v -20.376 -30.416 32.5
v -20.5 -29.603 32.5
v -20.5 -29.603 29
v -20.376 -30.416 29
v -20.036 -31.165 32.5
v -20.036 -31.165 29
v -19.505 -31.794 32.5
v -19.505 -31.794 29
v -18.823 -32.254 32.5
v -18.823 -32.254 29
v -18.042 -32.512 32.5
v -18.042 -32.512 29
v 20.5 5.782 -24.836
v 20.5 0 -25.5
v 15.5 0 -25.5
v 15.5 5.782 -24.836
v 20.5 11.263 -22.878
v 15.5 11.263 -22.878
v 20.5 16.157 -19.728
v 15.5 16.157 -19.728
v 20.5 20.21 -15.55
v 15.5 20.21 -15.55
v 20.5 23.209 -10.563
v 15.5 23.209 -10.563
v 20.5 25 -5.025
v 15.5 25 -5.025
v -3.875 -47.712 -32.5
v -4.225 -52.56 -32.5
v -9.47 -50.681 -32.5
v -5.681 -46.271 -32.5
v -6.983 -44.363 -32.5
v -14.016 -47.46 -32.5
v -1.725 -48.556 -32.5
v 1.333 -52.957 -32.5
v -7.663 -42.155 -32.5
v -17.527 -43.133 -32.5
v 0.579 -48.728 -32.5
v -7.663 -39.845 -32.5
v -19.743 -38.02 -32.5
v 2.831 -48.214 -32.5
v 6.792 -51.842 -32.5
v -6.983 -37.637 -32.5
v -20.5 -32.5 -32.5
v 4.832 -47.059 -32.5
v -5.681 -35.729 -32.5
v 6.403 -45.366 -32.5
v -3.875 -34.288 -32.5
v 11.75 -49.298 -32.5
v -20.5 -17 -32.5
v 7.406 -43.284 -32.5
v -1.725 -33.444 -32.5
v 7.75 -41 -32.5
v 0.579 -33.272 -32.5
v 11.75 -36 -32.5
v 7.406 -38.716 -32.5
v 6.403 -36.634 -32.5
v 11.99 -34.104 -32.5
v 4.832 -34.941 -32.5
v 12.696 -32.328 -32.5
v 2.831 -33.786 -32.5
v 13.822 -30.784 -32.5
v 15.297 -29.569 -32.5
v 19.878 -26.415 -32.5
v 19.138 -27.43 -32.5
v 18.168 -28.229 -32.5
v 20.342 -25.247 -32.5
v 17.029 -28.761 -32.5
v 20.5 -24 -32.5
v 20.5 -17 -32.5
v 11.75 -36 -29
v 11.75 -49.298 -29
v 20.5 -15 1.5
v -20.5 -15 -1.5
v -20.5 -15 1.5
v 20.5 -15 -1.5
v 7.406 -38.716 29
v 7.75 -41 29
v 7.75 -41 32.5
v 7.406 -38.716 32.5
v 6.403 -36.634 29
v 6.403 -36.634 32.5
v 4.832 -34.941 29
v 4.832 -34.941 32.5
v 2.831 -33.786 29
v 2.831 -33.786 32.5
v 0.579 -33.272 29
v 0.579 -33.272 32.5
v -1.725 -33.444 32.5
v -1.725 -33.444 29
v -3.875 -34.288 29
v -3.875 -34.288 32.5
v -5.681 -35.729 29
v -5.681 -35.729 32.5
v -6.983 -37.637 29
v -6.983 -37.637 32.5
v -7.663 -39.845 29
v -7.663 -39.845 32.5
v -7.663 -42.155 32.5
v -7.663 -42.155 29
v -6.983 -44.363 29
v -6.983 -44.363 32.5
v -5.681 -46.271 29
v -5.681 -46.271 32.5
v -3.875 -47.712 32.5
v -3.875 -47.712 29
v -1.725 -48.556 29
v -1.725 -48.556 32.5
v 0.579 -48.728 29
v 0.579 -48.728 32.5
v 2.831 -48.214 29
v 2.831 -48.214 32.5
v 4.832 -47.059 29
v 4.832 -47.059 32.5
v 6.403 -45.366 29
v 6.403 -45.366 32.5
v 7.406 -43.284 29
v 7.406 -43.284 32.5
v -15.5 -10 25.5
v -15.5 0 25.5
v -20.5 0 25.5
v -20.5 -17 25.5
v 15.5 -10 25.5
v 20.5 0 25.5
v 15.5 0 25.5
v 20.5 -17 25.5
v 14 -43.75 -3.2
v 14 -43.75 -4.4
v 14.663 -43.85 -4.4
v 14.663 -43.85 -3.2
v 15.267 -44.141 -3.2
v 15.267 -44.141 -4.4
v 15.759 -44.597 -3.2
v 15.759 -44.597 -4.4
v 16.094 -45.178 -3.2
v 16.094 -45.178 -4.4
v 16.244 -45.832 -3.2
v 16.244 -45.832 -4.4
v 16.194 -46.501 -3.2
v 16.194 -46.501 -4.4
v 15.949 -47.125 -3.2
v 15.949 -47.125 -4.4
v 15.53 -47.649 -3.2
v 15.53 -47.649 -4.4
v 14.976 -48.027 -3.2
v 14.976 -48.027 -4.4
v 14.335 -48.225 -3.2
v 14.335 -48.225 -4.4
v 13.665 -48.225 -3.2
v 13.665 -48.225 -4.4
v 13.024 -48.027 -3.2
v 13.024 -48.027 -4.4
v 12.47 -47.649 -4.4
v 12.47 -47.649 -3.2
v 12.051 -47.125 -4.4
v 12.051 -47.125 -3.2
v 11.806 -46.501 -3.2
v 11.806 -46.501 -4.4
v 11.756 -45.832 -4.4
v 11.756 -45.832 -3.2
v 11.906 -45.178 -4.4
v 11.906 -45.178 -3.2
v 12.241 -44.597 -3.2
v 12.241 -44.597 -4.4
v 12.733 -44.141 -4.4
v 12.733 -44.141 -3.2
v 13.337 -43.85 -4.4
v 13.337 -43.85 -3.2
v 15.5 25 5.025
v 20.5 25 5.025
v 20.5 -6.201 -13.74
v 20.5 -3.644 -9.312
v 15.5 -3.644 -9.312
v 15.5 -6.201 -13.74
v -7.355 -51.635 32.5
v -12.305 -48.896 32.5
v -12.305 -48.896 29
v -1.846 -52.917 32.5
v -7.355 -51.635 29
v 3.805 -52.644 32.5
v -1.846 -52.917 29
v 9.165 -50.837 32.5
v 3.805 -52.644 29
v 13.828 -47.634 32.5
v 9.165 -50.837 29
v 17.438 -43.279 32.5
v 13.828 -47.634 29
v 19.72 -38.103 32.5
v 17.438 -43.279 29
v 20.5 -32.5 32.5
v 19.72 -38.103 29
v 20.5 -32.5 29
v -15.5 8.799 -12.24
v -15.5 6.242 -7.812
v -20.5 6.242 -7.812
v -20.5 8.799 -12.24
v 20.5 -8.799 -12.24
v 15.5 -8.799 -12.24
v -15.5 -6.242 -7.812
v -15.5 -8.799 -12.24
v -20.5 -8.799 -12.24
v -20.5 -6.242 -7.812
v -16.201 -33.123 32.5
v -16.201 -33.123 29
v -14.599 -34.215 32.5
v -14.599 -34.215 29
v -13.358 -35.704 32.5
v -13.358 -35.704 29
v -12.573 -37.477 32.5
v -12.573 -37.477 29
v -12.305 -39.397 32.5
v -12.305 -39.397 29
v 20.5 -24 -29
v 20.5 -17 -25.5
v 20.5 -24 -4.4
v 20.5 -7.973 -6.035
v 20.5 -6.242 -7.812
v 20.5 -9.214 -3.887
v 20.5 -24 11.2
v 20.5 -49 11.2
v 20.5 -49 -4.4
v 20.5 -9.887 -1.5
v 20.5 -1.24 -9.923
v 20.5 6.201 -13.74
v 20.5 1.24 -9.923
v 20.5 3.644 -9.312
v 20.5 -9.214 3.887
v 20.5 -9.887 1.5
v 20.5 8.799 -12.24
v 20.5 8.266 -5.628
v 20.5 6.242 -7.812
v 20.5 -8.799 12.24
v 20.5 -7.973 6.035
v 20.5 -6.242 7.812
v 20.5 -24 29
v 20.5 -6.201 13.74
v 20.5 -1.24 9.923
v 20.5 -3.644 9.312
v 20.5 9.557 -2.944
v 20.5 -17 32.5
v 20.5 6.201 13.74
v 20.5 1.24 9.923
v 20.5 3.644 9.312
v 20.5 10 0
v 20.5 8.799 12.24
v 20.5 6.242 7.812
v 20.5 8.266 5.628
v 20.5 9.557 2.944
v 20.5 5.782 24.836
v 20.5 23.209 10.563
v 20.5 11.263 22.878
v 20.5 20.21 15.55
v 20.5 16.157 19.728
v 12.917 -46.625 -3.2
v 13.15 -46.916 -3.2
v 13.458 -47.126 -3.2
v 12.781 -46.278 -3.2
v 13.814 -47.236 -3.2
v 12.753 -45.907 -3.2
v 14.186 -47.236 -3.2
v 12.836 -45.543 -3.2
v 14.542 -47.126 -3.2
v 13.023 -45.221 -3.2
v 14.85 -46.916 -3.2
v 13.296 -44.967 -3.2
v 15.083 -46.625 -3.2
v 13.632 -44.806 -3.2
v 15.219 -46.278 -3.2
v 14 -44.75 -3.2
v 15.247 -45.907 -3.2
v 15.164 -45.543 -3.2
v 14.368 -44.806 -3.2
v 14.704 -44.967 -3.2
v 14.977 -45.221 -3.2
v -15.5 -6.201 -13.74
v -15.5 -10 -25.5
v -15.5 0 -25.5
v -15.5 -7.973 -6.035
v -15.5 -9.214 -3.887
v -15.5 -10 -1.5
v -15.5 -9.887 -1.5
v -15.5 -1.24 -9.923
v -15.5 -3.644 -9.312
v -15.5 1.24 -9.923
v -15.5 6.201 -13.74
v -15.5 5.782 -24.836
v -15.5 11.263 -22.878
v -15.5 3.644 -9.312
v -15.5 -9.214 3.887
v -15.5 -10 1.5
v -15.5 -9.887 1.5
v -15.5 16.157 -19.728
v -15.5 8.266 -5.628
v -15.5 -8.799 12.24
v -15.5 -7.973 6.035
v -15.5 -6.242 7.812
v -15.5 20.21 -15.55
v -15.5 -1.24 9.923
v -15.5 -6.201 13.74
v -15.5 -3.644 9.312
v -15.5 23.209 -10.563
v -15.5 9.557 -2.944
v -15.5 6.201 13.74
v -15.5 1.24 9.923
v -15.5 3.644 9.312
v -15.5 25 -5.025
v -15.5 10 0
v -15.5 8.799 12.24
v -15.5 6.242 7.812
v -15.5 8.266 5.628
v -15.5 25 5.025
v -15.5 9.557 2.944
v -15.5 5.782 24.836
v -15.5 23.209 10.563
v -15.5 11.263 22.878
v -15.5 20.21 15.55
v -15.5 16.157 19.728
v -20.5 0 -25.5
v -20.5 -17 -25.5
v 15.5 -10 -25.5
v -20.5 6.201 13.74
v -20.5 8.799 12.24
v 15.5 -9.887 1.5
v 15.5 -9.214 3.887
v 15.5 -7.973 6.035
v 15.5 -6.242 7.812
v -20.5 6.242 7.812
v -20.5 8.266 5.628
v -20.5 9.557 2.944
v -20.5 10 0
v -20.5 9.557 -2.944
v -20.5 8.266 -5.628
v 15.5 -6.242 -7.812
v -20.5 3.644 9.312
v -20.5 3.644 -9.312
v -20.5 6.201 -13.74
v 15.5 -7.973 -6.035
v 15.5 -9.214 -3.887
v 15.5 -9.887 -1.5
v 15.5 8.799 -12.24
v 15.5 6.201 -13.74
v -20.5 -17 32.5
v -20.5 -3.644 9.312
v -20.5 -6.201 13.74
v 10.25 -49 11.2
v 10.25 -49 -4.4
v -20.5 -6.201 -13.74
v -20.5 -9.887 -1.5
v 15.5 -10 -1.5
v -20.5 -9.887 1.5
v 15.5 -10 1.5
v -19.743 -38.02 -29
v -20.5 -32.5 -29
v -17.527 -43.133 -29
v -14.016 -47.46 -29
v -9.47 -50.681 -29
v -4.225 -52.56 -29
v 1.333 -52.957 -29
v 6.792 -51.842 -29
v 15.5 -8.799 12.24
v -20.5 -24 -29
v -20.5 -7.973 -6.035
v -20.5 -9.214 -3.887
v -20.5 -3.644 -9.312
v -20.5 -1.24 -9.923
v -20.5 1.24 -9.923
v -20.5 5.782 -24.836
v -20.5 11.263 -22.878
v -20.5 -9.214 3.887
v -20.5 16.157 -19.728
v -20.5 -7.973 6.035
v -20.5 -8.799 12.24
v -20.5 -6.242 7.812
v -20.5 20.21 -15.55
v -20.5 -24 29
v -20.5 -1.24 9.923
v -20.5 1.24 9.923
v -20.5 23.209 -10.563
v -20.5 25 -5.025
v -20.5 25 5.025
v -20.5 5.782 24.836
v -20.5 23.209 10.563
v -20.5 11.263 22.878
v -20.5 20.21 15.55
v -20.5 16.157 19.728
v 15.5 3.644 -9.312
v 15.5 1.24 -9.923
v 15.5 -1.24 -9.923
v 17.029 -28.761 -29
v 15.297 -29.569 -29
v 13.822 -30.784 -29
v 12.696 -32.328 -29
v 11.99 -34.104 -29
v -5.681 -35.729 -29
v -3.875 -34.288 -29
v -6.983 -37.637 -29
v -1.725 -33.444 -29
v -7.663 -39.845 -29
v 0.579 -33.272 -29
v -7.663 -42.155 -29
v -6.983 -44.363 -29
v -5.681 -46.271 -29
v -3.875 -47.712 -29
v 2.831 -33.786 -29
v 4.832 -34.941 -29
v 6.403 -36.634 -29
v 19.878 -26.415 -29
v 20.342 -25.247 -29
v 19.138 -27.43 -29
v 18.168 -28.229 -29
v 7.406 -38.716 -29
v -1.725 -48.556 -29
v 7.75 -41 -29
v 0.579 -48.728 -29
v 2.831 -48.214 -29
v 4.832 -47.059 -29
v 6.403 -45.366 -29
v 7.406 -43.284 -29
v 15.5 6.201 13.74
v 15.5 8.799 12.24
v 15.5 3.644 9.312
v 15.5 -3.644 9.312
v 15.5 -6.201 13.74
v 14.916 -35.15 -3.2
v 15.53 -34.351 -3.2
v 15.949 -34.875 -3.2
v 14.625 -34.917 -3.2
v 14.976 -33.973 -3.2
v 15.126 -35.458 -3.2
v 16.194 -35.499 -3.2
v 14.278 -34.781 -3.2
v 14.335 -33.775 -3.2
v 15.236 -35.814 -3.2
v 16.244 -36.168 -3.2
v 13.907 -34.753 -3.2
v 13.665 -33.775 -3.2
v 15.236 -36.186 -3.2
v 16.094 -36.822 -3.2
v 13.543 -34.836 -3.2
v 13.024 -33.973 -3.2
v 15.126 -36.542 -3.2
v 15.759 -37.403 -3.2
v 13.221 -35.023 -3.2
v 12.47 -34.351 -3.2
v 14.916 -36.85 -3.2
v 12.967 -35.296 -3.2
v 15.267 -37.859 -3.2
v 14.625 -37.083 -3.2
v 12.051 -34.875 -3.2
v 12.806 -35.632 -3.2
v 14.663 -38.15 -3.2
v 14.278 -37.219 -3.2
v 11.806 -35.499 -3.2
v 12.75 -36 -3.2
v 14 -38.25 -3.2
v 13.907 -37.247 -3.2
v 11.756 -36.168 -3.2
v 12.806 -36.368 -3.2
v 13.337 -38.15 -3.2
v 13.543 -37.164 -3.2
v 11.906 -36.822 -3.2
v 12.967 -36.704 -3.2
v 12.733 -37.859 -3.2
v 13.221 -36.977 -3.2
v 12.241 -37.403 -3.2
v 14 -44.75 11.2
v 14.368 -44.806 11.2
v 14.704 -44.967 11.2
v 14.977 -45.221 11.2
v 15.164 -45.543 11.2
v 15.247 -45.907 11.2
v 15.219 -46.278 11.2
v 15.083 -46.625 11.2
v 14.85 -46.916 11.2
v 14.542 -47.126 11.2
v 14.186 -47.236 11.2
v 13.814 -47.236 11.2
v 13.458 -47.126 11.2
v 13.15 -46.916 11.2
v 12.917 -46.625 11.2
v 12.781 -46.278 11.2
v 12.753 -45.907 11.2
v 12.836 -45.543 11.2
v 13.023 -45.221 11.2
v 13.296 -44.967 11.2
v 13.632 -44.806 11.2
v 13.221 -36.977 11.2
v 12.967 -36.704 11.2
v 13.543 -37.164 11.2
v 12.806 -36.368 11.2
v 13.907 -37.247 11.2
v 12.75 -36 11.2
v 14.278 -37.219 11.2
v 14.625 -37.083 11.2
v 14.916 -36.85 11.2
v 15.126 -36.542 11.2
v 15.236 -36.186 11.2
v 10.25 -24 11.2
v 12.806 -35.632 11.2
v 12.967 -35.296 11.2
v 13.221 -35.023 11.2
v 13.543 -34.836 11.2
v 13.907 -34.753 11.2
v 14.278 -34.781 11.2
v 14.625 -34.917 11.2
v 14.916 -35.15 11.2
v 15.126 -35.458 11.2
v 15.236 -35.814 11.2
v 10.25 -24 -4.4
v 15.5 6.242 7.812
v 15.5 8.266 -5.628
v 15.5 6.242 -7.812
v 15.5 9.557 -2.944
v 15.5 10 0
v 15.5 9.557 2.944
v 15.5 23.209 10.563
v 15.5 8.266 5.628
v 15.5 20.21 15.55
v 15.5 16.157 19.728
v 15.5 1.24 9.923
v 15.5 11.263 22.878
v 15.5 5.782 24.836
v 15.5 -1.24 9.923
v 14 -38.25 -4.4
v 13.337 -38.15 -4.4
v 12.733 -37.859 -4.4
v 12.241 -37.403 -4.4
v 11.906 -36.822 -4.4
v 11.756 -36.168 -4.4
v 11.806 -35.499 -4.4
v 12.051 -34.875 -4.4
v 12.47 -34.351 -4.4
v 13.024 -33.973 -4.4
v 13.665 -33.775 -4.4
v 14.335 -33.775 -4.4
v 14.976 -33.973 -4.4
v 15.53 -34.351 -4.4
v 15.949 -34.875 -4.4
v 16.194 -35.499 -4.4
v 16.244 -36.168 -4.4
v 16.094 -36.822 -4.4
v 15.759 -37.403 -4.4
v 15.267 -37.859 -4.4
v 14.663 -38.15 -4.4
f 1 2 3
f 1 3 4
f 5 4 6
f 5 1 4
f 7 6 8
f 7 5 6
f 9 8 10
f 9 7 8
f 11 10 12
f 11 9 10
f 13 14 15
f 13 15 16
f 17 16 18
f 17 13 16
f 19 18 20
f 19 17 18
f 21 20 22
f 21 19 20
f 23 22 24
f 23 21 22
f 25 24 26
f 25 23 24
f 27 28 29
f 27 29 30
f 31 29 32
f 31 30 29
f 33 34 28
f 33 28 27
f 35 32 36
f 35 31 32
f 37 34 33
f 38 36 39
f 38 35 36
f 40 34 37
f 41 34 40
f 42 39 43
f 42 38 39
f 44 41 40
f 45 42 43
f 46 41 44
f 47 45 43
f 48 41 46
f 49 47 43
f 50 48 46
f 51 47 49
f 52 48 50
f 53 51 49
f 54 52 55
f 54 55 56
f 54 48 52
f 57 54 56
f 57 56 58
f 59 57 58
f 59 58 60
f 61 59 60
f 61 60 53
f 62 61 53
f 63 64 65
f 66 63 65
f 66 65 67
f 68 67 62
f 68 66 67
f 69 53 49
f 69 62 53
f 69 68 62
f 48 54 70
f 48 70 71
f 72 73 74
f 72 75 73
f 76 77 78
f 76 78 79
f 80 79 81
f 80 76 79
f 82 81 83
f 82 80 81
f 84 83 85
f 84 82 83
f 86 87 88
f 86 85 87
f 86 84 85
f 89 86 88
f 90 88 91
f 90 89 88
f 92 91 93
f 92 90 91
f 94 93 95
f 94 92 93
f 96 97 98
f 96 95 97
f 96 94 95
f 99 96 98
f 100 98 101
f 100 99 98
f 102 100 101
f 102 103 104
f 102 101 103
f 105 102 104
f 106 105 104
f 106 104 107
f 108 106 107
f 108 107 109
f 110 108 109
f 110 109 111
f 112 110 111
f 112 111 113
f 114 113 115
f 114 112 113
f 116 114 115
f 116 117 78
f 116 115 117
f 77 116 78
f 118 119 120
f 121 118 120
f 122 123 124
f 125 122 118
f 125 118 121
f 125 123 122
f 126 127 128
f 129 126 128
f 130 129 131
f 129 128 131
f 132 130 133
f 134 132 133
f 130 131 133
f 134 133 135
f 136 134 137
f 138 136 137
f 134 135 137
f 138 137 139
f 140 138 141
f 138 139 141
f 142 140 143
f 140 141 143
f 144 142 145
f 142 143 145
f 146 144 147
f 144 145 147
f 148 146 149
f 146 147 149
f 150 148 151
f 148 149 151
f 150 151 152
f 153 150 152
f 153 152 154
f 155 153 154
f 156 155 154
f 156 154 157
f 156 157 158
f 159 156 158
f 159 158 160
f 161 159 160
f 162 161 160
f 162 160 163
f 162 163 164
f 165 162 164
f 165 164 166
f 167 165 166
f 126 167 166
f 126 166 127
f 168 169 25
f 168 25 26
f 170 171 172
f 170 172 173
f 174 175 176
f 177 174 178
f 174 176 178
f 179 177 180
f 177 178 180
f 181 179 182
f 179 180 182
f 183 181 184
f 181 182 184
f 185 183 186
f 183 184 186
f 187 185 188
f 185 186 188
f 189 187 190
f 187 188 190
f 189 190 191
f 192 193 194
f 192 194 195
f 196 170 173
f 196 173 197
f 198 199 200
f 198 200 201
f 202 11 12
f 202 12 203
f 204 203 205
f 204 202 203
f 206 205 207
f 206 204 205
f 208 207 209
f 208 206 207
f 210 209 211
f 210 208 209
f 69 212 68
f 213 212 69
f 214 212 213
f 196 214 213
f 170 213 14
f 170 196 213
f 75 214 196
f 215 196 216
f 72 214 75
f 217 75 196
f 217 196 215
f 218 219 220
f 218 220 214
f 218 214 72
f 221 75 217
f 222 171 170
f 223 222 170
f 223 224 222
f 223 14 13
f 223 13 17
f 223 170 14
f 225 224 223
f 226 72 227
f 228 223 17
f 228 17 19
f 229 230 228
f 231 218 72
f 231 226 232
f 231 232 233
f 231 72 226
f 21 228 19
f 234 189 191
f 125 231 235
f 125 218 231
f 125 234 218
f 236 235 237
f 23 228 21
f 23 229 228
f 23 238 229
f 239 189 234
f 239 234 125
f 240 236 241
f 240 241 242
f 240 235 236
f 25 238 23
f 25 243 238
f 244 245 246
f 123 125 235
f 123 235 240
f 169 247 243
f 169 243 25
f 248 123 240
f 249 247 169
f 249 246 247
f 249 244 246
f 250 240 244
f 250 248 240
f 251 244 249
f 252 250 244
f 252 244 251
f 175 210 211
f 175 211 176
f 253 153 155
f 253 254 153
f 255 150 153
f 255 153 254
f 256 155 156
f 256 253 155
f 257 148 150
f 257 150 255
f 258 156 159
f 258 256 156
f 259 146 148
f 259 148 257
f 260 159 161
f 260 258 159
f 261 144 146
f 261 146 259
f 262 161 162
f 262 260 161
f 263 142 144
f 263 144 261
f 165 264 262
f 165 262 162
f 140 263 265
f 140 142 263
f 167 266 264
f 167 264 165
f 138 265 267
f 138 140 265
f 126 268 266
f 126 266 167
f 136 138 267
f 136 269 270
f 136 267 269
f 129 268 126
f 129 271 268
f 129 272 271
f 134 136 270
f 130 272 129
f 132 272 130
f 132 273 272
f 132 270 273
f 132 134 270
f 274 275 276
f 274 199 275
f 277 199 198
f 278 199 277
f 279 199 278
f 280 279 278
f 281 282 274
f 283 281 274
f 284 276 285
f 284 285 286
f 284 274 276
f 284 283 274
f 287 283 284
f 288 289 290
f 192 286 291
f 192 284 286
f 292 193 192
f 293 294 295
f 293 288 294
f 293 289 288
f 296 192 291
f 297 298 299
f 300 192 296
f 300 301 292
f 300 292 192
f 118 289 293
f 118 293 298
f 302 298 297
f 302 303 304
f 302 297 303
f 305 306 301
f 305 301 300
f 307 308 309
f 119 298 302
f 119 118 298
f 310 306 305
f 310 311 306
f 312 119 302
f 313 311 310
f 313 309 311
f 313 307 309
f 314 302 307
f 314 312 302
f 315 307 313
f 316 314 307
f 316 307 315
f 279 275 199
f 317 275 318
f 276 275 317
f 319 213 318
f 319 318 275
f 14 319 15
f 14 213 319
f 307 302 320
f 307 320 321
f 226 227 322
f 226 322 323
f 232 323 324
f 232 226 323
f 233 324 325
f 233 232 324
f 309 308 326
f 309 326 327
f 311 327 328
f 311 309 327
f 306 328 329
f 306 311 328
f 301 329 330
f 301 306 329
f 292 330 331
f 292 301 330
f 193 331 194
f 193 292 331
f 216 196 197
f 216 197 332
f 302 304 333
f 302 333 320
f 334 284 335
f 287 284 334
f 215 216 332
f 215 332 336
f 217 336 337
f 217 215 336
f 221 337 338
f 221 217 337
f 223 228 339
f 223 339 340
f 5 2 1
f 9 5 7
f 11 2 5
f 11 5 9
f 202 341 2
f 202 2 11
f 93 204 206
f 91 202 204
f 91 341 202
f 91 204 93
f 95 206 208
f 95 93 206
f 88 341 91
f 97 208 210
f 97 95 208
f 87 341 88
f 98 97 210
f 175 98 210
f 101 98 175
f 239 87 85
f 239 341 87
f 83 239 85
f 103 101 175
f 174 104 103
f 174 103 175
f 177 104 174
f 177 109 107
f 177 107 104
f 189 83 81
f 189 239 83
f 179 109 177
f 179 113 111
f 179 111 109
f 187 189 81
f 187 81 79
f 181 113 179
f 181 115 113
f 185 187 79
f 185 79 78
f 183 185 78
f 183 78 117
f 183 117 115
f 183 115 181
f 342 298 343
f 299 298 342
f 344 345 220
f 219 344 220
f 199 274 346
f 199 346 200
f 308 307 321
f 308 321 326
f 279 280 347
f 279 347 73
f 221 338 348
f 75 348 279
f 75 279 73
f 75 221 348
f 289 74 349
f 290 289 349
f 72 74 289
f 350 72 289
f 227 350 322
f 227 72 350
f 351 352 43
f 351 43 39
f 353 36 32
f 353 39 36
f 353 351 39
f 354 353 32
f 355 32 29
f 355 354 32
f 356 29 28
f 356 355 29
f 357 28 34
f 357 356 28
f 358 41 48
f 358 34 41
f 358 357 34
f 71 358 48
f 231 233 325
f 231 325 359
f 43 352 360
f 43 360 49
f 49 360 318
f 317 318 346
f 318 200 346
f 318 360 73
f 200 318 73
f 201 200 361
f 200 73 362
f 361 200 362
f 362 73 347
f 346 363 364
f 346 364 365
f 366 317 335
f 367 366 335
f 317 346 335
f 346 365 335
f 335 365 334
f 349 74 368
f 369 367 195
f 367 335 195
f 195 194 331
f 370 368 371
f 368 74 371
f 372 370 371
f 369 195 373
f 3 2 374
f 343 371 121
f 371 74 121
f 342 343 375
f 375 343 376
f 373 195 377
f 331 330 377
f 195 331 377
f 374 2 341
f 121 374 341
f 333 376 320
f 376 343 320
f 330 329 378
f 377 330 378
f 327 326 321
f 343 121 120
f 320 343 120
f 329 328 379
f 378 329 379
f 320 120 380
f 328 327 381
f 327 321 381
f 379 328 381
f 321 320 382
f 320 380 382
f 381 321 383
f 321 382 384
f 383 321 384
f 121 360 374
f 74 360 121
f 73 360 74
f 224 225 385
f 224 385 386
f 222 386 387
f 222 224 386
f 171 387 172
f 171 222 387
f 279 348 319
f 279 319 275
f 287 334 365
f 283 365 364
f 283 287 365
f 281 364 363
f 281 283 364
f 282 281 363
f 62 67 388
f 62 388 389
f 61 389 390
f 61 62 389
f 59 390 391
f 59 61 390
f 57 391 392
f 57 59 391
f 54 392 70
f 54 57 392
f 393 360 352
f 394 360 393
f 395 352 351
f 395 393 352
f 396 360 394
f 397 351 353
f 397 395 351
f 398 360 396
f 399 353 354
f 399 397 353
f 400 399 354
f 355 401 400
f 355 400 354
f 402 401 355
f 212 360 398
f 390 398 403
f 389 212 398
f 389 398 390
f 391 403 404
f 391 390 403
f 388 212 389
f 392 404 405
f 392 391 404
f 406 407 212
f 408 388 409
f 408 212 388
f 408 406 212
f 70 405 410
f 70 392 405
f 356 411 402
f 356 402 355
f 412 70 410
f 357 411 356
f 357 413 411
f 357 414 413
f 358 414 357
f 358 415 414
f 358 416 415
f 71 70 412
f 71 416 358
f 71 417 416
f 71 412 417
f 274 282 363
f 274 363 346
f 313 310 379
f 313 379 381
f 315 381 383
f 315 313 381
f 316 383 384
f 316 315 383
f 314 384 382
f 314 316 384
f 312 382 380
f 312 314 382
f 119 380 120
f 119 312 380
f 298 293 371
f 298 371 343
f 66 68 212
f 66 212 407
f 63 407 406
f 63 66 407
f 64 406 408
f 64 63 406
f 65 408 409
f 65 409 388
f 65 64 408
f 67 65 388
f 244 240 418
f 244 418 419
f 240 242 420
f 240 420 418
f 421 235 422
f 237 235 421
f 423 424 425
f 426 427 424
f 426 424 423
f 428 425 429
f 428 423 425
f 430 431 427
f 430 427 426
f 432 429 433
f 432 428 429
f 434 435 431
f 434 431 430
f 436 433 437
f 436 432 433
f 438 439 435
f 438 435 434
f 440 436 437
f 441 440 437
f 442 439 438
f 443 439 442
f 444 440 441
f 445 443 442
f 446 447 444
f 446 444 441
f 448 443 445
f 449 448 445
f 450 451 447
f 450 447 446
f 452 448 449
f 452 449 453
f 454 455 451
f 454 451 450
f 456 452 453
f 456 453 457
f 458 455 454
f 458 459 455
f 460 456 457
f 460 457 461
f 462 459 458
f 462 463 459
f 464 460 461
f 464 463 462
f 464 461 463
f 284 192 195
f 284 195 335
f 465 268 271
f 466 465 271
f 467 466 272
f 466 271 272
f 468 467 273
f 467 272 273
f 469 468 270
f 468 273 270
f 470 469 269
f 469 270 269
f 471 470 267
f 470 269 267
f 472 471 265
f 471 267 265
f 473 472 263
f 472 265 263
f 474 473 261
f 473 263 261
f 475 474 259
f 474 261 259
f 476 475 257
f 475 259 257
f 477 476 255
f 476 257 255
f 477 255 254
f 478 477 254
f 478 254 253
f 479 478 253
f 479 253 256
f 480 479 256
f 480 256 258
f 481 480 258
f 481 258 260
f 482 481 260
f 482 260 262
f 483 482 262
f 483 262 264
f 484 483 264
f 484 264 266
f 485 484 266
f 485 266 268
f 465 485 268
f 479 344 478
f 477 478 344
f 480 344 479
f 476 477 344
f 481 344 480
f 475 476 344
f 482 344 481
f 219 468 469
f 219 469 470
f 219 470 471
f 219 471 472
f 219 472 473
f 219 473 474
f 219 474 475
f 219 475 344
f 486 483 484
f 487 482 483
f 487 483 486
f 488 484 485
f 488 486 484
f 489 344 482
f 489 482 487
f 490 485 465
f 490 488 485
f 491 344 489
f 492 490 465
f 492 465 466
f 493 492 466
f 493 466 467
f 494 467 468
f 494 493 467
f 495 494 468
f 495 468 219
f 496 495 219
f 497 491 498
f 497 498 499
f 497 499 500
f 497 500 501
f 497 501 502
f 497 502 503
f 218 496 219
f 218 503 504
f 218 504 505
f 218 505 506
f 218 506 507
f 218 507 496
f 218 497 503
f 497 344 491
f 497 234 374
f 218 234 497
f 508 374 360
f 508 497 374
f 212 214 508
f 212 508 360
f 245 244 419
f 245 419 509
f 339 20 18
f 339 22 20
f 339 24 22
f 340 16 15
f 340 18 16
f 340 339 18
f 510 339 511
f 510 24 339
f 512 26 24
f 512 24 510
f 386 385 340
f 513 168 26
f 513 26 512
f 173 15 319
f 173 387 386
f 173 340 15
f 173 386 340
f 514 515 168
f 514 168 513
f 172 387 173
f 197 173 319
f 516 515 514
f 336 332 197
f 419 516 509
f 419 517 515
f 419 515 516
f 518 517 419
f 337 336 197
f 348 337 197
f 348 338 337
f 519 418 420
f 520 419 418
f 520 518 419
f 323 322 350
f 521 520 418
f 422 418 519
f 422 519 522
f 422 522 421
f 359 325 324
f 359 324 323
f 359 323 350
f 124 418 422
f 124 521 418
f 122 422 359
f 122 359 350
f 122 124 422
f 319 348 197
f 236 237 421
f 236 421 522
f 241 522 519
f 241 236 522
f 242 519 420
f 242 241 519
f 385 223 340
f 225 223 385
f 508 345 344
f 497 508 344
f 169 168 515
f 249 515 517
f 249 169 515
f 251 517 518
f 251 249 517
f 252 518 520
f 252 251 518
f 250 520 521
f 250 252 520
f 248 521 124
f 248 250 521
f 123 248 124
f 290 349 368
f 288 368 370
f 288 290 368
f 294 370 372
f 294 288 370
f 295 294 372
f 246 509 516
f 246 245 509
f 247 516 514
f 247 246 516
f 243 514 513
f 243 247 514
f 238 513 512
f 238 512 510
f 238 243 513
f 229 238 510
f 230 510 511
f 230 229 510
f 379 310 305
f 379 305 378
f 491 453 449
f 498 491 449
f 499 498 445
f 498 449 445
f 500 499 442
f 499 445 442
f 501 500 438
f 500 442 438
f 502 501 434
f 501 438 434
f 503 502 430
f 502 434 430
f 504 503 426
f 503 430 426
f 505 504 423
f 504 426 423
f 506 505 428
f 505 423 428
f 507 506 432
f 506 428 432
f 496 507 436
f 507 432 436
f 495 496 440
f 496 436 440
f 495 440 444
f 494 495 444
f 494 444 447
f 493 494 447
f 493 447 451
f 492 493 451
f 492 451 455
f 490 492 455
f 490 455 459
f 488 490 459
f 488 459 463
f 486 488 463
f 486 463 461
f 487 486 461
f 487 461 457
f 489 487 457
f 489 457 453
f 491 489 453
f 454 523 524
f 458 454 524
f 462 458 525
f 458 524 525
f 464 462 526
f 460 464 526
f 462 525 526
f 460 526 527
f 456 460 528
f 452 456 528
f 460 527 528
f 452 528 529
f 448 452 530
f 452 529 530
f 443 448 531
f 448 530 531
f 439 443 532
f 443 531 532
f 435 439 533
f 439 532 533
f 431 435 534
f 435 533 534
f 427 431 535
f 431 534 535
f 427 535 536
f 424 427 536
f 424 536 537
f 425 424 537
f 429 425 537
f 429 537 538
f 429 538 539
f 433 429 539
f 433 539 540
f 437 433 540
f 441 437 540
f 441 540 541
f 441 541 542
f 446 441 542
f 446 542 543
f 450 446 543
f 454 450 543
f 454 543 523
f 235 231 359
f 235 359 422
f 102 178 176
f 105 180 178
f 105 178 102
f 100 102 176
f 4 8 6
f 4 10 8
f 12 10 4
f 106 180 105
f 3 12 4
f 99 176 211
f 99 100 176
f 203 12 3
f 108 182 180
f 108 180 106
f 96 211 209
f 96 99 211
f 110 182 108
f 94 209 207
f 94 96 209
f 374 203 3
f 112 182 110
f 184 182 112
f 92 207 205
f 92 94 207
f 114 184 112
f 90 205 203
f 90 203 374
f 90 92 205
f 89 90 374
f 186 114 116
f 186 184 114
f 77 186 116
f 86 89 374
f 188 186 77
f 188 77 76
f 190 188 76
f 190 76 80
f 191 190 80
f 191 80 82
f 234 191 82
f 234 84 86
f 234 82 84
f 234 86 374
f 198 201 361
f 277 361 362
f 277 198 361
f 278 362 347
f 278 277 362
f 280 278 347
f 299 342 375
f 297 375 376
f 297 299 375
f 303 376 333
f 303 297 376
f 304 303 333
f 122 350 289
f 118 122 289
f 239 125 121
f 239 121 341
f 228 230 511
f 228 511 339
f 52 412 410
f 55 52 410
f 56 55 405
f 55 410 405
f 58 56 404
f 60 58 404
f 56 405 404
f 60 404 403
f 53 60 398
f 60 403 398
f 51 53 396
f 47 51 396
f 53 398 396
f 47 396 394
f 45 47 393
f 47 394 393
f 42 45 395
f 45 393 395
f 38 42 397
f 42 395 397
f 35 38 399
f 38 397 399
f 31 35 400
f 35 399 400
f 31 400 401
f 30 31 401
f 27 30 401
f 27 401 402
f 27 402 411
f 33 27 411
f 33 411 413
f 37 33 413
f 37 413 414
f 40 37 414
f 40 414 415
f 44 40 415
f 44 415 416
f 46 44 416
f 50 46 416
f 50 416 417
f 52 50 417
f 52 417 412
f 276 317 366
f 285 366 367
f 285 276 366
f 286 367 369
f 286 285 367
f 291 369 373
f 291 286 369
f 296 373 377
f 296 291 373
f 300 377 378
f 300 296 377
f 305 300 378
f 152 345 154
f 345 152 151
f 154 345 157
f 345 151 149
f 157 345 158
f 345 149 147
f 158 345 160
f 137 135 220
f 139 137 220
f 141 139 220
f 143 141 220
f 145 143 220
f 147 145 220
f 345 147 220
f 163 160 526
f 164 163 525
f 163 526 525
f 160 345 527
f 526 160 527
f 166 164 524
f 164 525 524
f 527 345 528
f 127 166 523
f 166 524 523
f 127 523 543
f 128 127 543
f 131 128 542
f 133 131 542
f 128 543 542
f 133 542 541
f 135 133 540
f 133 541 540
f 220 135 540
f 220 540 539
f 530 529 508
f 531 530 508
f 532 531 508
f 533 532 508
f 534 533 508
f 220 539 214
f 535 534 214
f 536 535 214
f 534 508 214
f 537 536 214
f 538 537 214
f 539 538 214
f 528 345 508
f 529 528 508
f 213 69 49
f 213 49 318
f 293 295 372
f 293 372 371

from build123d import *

# Parameters (mm, degrees)
BOSS_EXTRUDE1_DEPTH     = 20.5
SKETCH2_W               = 88
SKETCH2_H               = 51
SKETCH2_R               = 7.75
CUT_EXTRUDE1_DEPTH      = 66.463730416
CUT_EXTRUDE1_DEPTH_BACK = 66.463730416
SKETCH4_W               = 10.25
SKETCH4_H               = 15.6
BOSS_EXTRUDE2_DEPTH     = 25
CUT_EXTRUDE2_REACH      = 69.756
SKETCH5_R               = 1.25
SKETCH6_R               = 2.25
CUT_EXTRUDE3_DEPTH      = 29.3
CUT_EXTRUDE4_REACH      = 88.338
CUT_EXTRUDE5_DEPTH      = 3.5


with BuildPart() as part:
    # Sketch1 → Boss-Extrude1 (new, symmetric)
    with BuildSketch(Plane.YZ):
        with BuildLine():
            Line((-53, -32.5), (-17, -32.5))
            Line((-17, -32.5), (-17, -25.5))
            Line((-17, -25.5), (0, -25.5))
            ThreePointArc((0, -25.5), (25.5, 0), (0, 25.5))
            Line((0, 25.5), (-17, 25.5))
            Line((-17, 25.5), (-17, 32.5))
            Line((-17, 32.5), (-53, 32.5))
            Line((-53, 32.5), (-53, 29))
            Line((-53, 29), (-24, 29))
            Line((-24, 29), (-24, -29))
            Line((-24, -29), (-53, -29))
            Line((-53, -29), (-53, -32.5))
        make_face()
        with BuildLine():
            Line((-3.644391878, -9.312271895), (-6.200961894, -13.740381057))
            Line((-6.200961894, -13.740381057), (-8.799038106, -12.240381057))
            Line((-8.799038106, -12.240381057), (-6.242468089, -7.812271895))
            ThreePointArc((-6.242468089, -7.812271895), (-8.660254038, -5), (-9.886859967, -1.5))
            Line((-9.886859967, -1.5), (-15, -1.5))
            Line((-15, -1.5), (-15, 1.5))
            Line((-15, 1.5), (-9.886859967, 1.5))
            ThreePointArc((-9.886859967, 1.5), (-8.660254038, 5), (-6.242468089, 7.812271895))
            Line((-6.242468089, 7.812271895), (-8.799038106, 12.240381057))
            Line((-8.799038106, 12.240381057), (-6.200961894, 13.740381057))
            Line((-6.200961894, 13.740381057), (-3.644391878, 9.312271895))
            ThreePointArc((-3.644391878, 9.312271895), (0, 10), (3.644391878, 9.312271895))
            Line((3.644391878, 9.312271895), (6.200961894, 13.740381057))
            Line((6.200961894, 13.740381057), (8.799038106, 12.240381057))
            Line((8.799038106, 12.240381057), (6.242468089, 7.812271895))
            ThreePointArc((6.242468089, 7.812271895), (10, 0), (6.242468089, -7.812271895))
            Line((6.242468089, -7.812271895), (8.799038106, -12.240381057))
            Line((8.799038106, -12.240381057), (6.200961894, -13.740381057))
            Line((6.200961894, -13.740381057), (3.644391878, -9.312271895))
            ThreePointArc((3.644391878, -9.312271895), (0, -10), (-3.644391878, -9.312271895))
        make_face(mode=Mode.SUBTRACT)
    extrude(amount=BOSS_EXTRUDE1_DEPTH, both=True)

    # Sketch2 → Cut-Extrude1 (cut, two sides)
    with BuildSketch(Plane(origin=(0, 0, 0), x_dir=(0, 1, 0), z_dir=(0, 0, 1))) as cut_extrude1_sk:
        with Locations((-14, 0)):
            Rectangle(SKETCH2_W, SKETCH2_H)
        with BuildLine():
            Line((-10, 15.5), (25, 15.5))
            Line((25, 15.5), (25, 20.5))
            Line((25, 20.5), (-32.5, 20.5))
            ThreePointArc((-32.5, 20.5), (-53, 0), (-32.5, -20.5))
            Line((-32.5, -20.5), (25, -20.5))
            Line((25, -20.5), (25, -15.5))
            Line((25, -15.5), (-10, -15.5))
            Line((-10, -15.5), (-10, 15.5))
        make_face(mode=Mode.SUBTRACT)
        with Locations(Location((-41, 0, 0), (0, 0, 270))):
            Circle(SKETCH2_R)
    extrude(amount=CUT_EXTRUDE1_DEPTH, mode=Mode.SUBTRACT)
    extrude(cut_extrude1_sk.sketch, amount=-CUT_EXTRUDE1_DEPTH_BACK, mode=Mode.SUBTRACT)

    # Sketch4 → Boss-Extrude2 (add)
    with BuildSketch(Plane.XZ.offset(24)):
        with Locations((15.375, 3.4)):
            Rectangle(SKETCH4_W, SKETCH4_H)
    extrude(amount=BOSS_EXTRUDE2_DEPTH)

    # Sketch5 → Cut-Extrude2 (cut, up to next)
    with BuildSketch(Plane(origin=(0, 0, -4.4), x_dir=(1, 0, 0), z_dir=(0, 0, -1)), mode=Mode.PRIVATE) as cut_extrude2_sk1:
        with Locations(Location((14, 46, 0), (0, 0, 270))):
            Circle(SKETCH5_R)
    cut_extrude2_tool1 = extrude(cut_extrude2_sk1.sketch, amount=-CUT_EXTRUDE2_REACH, mode=Mode.PRIVATE) & part.part
    # Sketch5 → Cut-Extrude2 (cut, up to next)
    with BuildSketch(Plane(origin=(0, 0, -4.4), x_dir=(1, 0, 0), z_dir=(0, 0, -1)), mode=Mode.PRIVATE) as cut_extrude2_sk2:
        with Locations(Location((14, 36, 0), (0, 0, 180))):
            Circle(SKETCH5_R)
    cut_extrude2_tool2 = extrude(cut_extrude2_sk2.sketch, amount=-CUT_EXTRUDE2_REACH, mode=Mode.PRIVATE) & part.part
    add(cut_extrude2_tool1.solids().sort_by_distance((14, -46, -4.4))[0], mode=Mode.SUBTRACT)
    add(cut_extrude2_tool2.solids().sort_by_distance((14, -36, -4.4))[0], mode=Mode.SUBTRACT)

    # Sketch6 → Cut-Extrude3 (cut)
    with BuildSketch(Plane(origin=(0, 0, -32.5), x_dir=(1, 0, 0), z_dir=(0, 0, -1))):
        with Locations(Location((14, 46, 0), (0, 0, 270))):
            Circle(SKETCH6_R)
        with Locations(Location((14, 36, 0), (0, 0, 90))):
            Circle(SKETCH6_R)
    extrude(amount=-CUT_EXTRUDE3_DEPTH, mode=Mode.SUBTRACT)

    # Sketch7 → Cut-Extrude4 (cut, up to next)
    with BuildSketch(Plane.XY.offset(32.5), mode=Mode.PRIVATE) as cut_extrude4_sk1:
        with BuildLine():
            Line((-12.304878049, -39.397222885), (-12.304878049, -48.89634033))
            Line((-12.304878049, -48.89634033), (-20.5, -48.89634033))
            Line((-20.5, -48.89634033), (-20.5, -41.884242803))
            Line((-20.5, -41.884242803), (-20.5, -29.602755078))
            ThreePointArc((-20.5, -29.602755078), (-19.791785251, -31.497638771), (-18.041662968, -32.512145713))
            ThreePointArc((-18.041662968, -32.512145713), (-13.927029708, -34.916291372), (-12.304878049, -39.397222885))
        make_face()
    cut_extrude4_tool1 = extrude(cut_extrude4_sk1.sketch, amount=-CUT_EXTRUDE4_REACH, mode=Mode.PRIVATE) & part.part
    add(cut_extrude4_tool1.solids().sort_by_distance((-16.657353, -41.093277, 32.5))[0], mode=Mode.SUBTRACT)

    # Sketch9 → Cut-Extrude5 (cut)
    with BuildSketch(Plane(origin=(0, 0, -32.5), x_dir=(1, 0, 0), z_dir=(0, 0, -1))):
        with BuildLine():
            Line((20.5, 49.298437427), (20.5, 24))
            ThreePointArc((20.5, 24), (19.540037651, 26.945860787), (17.028761689, 28.760555398))
            ThreePointArc((17.028761689, 28.760555398), (13.209828458, 31.520187417), (11.75, 36))
            Line((11.75, 36), (11.75, 49.298437427))
            Line((11.75, 49.298437427), (20.5, 49.298437427))
        make_face()
    extrude(amount=-CUT_EXTRUDE5_DEPTH, mode=Mode.SUBTRACT)


solid = part.part
